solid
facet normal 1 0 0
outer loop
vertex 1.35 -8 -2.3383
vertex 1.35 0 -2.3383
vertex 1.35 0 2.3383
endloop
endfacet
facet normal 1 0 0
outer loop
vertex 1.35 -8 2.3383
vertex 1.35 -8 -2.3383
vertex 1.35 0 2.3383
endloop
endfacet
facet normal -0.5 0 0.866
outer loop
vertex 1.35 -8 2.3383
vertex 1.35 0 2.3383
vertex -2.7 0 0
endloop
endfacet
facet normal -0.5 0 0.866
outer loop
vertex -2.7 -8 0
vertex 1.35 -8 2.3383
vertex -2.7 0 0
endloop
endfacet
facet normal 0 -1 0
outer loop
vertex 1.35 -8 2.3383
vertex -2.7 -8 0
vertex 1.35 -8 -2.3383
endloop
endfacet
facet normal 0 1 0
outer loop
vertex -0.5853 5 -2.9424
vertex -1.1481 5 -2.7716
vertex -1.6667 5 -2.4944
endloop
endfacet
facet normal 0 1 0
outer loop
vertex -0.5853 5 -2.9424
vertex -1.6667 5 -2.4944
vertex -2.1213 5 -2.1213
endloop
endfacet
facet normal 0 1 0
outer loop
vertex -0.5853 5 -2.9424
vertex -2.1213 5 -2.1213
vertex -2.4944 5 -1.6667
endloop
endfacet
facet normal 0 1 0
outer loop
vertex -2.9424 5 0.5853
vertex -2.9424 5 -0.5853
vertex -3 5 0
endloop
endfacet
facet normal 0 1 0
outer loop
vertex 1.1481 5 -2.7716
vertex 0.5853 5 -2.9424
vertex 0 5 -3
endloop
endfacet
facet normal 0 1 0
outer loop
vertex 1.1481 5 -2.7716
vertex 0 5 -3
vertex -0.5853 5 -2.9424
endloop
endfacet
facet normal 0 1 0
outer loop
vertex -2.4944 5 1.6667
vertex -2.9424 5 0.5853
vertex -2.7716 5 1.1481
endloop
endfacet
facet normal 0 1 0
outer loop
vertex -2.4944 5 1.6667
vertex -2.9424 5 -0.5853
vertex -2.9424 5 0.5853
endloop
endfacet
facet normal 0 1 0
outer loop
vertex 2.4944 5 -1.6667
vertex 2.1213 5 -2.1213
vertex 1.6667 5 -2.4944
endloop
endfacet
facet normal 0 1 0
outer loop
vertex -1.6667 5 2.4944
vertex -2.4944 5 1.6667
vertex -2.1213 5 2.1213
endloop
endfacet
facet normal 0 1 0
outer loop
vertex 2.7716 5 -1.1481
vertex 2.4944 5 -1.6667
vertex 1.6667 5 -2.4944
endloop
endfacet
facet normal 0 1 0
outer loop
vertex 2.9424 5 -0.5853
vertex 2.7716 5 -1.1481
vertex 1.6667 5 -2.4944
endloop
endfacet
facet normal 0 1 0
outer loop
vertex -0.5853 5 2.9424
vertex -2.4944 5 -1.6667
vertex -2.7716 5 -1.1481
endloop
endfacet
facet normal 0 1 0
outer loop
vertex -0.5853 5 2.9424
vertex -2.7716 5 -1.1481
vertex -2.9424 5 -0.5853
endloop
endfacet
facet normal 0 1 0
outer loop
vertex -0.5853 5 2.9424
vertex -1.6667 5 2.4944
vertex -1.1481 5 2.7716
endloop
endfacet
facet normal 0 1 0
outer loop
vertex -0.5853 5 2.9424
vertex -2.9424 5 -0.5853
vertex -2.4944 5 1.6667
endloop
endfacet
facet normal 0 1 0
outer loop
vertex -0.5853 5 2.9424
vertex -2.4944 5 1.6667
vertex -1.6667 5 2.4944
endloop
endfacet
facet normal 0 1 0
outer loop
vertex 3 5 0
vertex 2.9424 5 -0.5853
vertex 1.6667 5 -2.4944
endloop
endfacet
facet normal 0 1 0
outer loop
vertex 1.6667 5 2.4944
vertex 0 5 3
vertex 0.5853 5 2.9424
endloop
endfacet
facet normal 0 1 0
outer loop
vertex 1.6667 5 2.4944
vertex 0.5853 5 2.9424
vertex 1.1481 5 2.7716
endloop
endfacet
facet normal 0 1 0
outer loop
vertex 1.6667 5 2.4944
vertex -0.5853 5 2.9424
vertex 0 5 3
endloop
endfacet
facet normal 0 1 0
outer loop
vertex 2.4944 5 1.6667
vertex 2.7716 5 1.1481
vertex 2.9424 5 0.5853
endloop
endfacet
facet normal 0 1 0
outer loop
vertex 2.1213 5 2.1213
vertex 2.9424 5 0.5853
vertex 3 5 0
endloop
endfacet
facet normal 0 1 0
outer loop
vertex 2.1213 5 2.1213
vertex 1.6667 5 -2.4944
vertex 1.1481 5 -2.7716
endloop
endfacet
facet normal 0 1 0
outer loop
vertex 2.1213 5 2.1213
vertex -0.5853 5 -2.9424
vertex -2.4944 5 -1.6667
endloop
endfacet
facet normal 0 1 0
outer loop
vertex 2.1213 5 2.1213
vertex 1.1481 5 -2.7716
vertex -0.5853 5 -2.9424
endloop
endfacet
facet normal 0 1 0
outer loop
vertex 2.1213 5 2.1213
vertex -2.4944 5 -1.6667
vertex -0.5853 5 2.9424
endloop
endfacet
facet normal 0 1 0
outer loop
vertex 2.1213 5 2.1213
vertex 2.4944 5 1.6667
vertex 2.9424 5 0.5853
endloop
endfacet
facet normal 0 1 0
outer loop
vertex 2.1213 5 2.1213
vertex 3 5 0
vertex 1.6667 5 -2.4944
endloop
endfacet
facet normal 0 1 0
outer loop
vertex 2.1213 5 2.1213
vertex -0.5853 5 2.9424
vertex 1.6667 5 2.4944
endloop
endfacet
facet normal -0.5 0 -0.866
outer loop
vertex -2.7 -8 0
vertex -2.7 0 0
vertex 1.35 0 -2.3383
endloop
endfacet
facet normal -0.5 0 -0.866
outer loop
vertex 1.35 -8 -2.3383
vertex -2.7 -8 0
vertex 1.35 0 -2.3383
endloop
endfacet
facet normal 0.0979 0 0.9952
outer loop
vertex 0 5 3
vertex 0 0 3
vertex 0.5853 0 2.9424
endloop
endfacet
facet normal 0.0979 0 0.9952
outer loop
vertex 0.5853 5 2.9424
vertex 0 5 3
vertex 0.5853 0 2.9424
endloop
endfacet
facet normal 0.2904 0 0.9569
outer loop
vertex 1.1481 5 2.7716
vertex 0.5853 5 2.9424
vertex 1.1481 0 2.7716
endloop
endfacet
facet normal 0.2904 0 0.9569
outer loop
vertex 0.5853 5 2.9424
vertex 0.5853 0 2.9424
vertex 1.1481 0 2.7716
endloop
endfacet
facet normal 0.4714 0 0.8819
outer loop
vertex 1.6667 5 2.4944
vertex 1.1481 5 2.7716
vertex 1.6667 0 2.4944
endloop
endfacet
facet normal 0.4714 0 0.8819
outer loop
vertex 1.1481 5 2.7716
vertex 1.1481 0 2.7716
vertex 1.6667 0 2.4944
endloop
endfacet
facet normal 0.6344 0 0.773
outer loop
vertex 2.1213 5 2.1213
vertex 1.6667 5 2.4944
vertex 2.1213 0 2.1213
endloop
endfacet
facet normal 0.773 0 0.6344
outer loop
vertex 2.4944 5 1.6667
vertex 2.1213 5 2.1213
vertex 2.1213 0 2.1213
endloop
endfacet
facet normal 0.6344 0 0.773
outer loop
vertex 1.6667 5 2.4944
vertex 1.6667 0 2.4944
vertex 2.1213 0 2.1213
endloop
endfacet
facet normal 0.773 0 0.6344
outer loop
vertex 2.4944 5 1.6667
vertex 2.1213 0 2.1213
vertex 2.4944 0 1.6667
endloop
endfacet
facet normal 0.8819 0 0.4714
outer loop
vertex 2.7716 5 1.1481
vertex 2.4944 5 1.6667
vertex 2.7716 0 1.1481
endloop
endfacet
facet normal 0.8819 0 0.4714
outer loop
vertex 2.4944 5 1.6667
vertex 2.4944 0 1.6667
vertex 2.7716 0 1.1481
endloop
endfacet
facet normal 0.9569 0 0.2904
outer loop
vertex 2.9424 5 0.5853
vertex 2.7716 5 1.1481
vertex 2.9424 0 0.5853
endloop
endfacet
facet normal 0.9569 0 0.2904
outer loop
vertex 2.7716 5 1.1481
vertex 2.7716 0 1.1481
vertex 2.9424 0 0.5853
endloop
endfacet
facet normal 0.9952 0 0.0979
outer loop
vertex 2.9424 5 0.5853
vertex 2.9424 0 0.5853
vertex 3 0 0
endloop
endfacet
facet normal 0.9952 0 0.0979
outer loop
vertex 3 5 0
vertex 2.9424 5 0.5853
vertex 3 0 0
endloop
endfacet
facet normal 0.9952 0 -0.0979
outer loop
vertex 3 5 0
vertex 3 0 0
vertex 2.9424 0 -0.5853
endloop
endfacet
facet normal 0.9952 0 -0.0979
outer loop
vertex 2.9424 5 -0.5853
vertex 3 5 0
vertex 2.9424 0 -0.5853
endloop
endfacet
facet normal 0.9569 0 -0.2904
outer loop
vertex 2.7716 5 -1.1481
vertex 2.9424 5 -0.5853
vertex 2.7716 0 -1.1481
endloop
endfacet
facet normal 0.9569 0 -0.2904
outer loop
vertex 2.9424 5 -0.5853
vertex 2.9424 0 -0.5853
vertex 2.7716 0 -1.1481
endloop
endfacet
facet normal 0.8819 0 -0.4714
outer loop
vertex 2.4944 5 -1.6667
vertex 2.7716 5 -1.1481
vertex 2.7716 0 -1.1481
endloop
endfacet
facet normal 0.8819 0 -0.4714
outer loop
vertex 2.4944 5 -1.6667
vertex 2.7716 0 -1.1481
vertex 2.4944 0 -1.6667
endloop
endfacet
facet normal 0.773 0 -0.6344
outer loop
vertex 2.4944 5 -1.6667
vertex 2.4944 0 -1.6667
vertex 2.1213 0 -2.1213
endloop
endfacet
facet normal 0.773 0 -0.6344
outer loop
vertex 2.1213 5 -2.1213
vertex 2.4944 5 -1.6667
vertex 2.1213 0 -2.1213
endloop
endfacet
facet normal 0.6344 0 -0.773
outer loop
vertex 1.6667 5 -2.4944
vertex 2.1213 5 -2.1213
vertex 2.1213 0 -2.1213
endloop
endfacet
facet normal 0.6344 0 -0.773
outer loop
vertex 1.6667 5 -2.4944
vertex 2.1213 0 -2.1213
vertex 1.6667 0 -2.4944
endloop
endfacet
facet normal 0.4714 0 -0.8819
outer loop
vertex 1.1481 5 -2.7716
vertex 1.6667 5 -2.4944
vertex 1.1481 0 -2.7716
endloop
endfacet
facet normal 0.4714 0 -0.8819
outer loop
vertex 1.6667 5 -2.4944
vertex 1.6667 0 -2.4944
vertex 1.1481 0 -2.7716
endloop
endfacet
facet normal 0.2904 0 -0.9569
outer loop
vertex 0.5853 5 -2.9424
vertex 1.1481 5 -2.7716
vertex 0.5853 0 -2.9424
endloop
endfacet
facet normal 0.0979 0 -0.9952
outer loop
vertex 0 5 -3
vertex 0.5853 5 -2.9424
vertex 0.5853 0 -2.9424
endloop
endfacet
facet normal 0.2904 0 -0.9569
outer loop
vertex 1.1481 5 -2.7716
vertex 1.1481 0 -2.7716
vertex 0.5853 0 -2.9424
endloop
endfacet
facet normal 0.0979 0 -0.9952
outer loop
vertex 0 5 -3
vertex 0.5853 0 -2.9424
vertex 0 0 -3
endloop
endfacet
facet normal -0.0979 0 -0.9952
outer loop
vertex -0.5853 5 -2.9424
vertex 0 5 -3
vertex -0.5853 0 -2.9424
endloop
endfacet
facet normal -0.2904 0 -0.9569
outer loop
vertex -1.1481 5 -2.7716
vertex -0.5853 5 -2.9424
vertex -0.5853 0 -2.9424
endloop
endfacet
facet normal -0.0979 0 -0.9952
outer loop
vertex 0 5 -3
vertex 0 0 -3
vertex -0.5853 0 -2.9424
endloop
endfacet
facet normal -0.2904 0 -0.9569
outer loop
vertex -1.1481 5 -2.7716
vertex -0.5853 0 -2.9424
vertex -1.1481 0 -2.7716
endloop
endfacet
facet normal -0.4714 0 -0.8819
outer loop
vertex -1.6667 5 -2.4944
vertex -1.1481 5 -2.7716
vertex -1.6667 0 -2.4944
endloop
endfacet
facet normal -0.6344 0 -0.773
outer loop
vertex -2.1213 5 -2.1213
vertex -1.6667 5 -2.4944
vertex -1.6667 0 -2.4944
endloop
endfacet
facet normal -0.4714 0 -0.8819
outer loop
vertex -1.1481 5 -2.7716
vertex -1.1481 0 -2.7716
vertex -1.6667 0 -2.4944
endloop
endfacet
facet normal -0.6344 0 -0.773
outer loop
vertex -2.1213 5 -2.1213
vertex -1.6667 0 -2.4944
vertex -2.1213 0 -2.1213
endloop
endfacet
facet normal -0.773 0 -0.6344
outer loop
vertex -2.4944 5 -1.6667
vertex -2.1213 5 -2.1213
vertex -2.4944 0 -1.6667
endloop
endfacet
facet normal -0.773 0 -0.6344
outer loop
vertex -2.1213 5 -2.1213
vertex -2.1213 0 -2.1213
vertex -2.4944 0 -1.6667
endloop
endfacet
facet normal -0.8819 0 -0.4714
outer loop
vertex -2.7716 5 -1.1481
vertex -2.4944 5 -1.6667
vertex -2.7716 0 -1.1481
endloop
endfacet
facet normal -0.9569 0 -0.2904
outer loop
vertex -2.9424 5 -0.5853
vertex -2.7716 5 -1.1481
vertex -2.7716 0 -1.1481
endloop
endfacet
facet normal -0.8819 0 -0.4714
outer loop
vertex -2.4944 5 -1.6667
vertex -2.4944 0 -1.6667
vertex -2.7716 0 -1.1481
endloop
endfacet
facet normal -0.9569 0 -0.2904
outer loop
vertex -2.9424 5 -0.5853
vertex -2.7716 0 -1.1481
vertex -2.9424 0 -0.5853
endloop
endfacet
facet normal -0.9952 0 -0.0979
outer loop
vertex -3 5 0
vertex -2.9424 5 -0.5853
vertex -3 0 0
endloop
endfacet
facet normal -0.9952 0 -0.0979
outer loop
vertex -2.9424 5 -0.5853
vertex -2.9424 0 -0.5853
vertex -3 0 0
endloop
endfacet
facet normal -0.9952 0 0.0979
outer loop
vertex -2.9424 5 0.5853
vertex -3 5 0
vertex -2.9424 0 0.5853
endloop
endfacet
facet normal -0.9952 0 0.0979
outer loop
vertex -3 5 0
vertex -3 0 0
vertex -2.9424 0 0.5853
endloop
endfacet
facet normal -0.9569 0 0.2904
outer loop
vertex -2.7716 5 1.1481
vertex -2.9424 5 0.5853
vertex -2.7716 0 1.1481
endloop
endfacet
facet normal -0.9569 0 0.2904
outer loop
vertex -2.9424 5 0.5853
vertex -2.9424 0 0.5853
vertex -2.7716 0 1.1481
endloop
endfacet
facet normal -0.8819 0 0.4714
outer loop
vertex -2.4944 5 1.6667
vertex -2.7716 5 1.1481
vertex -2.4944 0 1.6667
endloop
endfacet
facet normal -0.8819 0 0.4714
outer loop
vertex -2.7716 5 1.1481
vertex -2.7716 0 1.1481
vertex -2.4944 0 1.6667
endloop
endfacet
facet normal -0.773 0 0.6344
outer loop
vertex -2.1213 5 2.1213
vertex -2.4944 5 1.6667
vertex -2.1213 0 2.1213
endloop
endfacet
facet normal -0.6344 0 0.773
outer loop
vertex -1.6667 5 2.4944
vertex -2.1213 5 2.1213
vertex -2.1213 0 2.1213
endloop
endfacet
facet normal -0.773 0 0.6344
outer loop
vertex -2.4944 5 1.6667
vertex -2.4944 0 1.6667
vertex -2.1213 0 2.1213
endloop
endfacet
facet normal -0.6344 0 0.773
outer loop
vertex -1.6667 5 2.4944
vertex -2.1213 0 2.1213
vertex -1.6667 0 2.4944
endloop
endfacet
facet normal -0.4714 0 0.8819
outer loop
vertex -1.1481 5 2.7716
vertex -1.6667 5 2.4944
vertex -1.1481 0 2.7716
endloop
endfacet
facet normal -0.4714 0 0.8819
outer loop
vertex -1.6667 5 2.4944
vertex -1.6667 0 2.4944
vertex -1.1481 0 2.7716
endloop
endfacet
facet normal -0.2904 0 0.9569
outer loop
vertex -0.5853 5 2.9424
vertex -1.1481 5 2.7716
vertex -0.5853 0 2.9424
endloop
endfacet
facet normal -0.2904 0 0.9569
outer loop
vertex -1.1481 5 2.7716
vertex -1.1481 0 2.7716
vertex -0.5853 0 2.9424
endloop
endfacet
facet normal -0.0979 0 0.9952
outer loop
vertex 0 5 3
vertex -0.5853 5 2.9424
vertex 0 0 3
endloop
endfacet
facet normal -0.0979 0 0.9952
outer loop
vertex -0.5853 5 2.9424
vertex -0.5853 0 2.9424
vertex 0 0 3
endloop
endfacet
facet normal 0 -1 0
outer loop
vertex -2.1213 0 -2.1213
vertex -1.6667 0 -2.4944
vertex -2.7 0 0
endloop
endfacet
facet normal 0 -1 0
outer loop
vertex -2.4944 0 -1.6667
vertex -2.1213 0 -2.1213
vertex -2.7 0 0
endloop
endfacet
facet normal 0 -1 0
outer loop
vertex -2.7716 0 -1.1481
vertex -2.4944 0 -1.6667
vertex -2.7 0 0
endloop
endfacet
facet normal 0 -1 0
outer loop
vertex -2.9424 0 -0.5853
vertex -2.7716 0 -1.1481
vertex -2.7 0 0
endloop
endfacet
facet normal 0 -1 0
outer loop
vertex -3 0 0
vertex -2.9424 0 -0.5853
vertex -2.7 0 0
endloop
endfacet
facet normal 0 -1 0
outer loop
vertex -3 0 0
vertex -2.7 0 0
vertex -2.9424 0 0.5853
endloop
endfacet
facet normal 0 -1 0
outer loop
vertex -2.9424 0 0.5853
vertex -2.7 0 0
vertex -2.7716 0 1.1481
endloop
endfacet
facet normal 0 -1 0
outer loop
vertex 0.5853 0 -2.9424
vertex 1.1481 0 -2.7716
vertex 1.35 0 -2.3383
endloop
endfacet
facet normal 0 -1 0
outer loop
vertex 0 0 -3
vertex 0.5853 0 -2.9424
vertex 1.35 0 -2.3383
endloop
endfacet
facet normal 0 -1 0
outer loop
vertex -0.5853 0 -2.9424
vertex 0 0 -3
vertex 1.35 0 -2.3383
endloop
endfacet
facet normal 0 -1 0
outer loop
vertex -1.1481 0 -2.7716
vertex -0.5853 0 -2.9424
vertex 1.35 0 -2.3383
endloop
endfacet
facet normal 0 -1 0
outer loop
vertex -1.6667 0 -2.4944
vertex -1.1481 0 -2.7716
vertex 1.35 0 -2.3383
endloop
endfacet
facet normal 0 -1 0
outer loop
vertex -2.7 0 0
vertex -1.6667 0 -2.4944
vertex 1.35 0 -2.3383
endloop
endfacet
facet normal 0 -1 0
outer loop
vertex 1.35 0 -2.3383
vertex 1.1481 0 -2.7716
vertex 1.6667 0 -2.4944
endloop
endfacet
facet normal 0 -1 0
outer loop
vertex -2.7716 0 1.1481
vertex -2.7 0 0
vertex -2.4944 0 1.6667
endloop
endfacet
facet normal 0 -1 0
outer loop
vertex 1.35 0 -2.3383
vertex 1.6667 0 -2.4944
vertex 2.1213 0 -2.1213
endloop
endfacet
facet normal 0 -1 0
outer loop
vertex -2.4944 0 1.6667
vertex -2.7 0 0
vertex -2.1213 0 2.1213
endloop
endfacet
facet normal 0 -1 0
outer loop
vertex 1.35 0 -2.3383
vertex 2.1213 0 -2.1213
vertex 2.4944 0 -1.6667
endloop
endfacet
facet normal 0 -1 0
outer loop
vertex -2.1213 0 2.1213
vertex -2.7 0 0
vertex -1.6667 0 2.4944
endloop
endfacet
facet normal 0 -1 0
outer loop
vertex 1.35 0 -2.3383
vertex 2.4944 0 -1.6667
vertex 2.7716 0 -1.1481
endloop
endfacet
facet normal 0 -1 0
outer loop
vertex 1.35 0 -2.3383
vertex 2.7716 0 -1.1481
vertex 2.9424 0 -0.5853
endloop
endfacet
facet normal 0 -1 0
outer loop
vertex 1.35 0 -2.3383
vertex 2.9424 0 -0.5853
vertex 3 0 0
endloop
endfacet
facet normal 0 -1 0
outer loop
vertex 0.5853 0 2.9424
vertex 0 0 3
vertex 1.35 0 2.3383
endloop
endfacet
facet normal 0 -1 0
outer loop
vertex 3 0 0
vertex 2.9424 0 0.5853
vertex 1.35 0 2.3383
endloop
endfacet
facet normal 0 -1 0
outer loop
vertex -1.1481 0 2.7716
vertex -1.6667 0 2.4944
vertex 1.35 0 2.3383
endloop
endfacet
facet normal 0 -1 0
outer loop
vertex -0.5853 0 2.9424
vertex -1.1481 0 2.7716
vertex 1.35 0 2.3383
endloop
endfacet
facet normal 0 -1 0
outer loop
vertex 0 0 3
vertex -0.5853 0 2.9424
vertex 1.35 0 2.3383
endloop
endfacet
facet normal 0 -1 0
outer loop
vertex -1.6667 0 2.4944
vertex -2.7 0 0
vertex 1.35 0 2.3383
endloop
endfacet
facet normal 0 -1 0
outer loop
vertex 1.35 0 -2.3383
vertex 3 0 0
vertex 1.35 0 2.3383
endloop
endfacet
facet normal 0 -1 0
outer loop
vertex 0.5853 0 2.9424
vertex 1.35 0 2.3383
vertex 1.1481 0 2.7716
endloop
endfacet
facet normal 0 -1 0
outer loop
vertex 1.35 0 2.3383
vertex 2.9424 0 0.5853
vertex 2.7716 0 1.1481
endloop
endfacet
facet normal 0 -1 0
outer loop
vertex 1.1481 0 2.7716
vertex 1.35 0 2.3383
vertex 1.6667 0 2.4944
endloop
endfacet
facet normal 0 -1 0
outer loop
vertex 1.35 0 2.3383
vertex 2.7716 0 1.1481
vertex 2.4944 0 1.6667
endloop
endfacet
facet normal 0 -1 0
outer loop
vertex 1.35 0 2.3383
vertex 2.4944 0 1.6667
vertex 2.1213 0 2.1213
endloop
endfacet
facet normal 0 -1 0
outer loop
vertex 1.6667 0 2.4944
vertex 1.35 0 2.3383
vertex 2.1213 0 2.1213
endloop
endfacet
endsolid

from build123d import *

# Parameters (mm, degrees)
SKETCH1_R           = 3
BOSS_EXTRUDE1_DEPTH = 5
BOSS_EXTRUDE2_DEPTH = 8


with BuildPart() as part:
    # Sketch1 → Boss-Extrude1 (new body)
    with BuildSketch(Plane(origin=(0, 0, 0), x_dir=(1, 0, 0), z_dir=(0, 1, 0))):
        with Locations(Location((0, 0, 0), (0, 0, 270))):
            Circle(SKETCH1_R)
    extrude(amount=BOSS_EXTRUDE1_DEPTH)

    # Sketch2 → Boss-Extrude2 (add)
    with BuildSketch(Plane.XZ):
        Polygon((1.35, -2.33826859), (1.35, 2.33826859), (-2.7, 0), align=None)
    extrude(amount=BOSS_EXTRUDE2_DEPTH)


solid = part.part
